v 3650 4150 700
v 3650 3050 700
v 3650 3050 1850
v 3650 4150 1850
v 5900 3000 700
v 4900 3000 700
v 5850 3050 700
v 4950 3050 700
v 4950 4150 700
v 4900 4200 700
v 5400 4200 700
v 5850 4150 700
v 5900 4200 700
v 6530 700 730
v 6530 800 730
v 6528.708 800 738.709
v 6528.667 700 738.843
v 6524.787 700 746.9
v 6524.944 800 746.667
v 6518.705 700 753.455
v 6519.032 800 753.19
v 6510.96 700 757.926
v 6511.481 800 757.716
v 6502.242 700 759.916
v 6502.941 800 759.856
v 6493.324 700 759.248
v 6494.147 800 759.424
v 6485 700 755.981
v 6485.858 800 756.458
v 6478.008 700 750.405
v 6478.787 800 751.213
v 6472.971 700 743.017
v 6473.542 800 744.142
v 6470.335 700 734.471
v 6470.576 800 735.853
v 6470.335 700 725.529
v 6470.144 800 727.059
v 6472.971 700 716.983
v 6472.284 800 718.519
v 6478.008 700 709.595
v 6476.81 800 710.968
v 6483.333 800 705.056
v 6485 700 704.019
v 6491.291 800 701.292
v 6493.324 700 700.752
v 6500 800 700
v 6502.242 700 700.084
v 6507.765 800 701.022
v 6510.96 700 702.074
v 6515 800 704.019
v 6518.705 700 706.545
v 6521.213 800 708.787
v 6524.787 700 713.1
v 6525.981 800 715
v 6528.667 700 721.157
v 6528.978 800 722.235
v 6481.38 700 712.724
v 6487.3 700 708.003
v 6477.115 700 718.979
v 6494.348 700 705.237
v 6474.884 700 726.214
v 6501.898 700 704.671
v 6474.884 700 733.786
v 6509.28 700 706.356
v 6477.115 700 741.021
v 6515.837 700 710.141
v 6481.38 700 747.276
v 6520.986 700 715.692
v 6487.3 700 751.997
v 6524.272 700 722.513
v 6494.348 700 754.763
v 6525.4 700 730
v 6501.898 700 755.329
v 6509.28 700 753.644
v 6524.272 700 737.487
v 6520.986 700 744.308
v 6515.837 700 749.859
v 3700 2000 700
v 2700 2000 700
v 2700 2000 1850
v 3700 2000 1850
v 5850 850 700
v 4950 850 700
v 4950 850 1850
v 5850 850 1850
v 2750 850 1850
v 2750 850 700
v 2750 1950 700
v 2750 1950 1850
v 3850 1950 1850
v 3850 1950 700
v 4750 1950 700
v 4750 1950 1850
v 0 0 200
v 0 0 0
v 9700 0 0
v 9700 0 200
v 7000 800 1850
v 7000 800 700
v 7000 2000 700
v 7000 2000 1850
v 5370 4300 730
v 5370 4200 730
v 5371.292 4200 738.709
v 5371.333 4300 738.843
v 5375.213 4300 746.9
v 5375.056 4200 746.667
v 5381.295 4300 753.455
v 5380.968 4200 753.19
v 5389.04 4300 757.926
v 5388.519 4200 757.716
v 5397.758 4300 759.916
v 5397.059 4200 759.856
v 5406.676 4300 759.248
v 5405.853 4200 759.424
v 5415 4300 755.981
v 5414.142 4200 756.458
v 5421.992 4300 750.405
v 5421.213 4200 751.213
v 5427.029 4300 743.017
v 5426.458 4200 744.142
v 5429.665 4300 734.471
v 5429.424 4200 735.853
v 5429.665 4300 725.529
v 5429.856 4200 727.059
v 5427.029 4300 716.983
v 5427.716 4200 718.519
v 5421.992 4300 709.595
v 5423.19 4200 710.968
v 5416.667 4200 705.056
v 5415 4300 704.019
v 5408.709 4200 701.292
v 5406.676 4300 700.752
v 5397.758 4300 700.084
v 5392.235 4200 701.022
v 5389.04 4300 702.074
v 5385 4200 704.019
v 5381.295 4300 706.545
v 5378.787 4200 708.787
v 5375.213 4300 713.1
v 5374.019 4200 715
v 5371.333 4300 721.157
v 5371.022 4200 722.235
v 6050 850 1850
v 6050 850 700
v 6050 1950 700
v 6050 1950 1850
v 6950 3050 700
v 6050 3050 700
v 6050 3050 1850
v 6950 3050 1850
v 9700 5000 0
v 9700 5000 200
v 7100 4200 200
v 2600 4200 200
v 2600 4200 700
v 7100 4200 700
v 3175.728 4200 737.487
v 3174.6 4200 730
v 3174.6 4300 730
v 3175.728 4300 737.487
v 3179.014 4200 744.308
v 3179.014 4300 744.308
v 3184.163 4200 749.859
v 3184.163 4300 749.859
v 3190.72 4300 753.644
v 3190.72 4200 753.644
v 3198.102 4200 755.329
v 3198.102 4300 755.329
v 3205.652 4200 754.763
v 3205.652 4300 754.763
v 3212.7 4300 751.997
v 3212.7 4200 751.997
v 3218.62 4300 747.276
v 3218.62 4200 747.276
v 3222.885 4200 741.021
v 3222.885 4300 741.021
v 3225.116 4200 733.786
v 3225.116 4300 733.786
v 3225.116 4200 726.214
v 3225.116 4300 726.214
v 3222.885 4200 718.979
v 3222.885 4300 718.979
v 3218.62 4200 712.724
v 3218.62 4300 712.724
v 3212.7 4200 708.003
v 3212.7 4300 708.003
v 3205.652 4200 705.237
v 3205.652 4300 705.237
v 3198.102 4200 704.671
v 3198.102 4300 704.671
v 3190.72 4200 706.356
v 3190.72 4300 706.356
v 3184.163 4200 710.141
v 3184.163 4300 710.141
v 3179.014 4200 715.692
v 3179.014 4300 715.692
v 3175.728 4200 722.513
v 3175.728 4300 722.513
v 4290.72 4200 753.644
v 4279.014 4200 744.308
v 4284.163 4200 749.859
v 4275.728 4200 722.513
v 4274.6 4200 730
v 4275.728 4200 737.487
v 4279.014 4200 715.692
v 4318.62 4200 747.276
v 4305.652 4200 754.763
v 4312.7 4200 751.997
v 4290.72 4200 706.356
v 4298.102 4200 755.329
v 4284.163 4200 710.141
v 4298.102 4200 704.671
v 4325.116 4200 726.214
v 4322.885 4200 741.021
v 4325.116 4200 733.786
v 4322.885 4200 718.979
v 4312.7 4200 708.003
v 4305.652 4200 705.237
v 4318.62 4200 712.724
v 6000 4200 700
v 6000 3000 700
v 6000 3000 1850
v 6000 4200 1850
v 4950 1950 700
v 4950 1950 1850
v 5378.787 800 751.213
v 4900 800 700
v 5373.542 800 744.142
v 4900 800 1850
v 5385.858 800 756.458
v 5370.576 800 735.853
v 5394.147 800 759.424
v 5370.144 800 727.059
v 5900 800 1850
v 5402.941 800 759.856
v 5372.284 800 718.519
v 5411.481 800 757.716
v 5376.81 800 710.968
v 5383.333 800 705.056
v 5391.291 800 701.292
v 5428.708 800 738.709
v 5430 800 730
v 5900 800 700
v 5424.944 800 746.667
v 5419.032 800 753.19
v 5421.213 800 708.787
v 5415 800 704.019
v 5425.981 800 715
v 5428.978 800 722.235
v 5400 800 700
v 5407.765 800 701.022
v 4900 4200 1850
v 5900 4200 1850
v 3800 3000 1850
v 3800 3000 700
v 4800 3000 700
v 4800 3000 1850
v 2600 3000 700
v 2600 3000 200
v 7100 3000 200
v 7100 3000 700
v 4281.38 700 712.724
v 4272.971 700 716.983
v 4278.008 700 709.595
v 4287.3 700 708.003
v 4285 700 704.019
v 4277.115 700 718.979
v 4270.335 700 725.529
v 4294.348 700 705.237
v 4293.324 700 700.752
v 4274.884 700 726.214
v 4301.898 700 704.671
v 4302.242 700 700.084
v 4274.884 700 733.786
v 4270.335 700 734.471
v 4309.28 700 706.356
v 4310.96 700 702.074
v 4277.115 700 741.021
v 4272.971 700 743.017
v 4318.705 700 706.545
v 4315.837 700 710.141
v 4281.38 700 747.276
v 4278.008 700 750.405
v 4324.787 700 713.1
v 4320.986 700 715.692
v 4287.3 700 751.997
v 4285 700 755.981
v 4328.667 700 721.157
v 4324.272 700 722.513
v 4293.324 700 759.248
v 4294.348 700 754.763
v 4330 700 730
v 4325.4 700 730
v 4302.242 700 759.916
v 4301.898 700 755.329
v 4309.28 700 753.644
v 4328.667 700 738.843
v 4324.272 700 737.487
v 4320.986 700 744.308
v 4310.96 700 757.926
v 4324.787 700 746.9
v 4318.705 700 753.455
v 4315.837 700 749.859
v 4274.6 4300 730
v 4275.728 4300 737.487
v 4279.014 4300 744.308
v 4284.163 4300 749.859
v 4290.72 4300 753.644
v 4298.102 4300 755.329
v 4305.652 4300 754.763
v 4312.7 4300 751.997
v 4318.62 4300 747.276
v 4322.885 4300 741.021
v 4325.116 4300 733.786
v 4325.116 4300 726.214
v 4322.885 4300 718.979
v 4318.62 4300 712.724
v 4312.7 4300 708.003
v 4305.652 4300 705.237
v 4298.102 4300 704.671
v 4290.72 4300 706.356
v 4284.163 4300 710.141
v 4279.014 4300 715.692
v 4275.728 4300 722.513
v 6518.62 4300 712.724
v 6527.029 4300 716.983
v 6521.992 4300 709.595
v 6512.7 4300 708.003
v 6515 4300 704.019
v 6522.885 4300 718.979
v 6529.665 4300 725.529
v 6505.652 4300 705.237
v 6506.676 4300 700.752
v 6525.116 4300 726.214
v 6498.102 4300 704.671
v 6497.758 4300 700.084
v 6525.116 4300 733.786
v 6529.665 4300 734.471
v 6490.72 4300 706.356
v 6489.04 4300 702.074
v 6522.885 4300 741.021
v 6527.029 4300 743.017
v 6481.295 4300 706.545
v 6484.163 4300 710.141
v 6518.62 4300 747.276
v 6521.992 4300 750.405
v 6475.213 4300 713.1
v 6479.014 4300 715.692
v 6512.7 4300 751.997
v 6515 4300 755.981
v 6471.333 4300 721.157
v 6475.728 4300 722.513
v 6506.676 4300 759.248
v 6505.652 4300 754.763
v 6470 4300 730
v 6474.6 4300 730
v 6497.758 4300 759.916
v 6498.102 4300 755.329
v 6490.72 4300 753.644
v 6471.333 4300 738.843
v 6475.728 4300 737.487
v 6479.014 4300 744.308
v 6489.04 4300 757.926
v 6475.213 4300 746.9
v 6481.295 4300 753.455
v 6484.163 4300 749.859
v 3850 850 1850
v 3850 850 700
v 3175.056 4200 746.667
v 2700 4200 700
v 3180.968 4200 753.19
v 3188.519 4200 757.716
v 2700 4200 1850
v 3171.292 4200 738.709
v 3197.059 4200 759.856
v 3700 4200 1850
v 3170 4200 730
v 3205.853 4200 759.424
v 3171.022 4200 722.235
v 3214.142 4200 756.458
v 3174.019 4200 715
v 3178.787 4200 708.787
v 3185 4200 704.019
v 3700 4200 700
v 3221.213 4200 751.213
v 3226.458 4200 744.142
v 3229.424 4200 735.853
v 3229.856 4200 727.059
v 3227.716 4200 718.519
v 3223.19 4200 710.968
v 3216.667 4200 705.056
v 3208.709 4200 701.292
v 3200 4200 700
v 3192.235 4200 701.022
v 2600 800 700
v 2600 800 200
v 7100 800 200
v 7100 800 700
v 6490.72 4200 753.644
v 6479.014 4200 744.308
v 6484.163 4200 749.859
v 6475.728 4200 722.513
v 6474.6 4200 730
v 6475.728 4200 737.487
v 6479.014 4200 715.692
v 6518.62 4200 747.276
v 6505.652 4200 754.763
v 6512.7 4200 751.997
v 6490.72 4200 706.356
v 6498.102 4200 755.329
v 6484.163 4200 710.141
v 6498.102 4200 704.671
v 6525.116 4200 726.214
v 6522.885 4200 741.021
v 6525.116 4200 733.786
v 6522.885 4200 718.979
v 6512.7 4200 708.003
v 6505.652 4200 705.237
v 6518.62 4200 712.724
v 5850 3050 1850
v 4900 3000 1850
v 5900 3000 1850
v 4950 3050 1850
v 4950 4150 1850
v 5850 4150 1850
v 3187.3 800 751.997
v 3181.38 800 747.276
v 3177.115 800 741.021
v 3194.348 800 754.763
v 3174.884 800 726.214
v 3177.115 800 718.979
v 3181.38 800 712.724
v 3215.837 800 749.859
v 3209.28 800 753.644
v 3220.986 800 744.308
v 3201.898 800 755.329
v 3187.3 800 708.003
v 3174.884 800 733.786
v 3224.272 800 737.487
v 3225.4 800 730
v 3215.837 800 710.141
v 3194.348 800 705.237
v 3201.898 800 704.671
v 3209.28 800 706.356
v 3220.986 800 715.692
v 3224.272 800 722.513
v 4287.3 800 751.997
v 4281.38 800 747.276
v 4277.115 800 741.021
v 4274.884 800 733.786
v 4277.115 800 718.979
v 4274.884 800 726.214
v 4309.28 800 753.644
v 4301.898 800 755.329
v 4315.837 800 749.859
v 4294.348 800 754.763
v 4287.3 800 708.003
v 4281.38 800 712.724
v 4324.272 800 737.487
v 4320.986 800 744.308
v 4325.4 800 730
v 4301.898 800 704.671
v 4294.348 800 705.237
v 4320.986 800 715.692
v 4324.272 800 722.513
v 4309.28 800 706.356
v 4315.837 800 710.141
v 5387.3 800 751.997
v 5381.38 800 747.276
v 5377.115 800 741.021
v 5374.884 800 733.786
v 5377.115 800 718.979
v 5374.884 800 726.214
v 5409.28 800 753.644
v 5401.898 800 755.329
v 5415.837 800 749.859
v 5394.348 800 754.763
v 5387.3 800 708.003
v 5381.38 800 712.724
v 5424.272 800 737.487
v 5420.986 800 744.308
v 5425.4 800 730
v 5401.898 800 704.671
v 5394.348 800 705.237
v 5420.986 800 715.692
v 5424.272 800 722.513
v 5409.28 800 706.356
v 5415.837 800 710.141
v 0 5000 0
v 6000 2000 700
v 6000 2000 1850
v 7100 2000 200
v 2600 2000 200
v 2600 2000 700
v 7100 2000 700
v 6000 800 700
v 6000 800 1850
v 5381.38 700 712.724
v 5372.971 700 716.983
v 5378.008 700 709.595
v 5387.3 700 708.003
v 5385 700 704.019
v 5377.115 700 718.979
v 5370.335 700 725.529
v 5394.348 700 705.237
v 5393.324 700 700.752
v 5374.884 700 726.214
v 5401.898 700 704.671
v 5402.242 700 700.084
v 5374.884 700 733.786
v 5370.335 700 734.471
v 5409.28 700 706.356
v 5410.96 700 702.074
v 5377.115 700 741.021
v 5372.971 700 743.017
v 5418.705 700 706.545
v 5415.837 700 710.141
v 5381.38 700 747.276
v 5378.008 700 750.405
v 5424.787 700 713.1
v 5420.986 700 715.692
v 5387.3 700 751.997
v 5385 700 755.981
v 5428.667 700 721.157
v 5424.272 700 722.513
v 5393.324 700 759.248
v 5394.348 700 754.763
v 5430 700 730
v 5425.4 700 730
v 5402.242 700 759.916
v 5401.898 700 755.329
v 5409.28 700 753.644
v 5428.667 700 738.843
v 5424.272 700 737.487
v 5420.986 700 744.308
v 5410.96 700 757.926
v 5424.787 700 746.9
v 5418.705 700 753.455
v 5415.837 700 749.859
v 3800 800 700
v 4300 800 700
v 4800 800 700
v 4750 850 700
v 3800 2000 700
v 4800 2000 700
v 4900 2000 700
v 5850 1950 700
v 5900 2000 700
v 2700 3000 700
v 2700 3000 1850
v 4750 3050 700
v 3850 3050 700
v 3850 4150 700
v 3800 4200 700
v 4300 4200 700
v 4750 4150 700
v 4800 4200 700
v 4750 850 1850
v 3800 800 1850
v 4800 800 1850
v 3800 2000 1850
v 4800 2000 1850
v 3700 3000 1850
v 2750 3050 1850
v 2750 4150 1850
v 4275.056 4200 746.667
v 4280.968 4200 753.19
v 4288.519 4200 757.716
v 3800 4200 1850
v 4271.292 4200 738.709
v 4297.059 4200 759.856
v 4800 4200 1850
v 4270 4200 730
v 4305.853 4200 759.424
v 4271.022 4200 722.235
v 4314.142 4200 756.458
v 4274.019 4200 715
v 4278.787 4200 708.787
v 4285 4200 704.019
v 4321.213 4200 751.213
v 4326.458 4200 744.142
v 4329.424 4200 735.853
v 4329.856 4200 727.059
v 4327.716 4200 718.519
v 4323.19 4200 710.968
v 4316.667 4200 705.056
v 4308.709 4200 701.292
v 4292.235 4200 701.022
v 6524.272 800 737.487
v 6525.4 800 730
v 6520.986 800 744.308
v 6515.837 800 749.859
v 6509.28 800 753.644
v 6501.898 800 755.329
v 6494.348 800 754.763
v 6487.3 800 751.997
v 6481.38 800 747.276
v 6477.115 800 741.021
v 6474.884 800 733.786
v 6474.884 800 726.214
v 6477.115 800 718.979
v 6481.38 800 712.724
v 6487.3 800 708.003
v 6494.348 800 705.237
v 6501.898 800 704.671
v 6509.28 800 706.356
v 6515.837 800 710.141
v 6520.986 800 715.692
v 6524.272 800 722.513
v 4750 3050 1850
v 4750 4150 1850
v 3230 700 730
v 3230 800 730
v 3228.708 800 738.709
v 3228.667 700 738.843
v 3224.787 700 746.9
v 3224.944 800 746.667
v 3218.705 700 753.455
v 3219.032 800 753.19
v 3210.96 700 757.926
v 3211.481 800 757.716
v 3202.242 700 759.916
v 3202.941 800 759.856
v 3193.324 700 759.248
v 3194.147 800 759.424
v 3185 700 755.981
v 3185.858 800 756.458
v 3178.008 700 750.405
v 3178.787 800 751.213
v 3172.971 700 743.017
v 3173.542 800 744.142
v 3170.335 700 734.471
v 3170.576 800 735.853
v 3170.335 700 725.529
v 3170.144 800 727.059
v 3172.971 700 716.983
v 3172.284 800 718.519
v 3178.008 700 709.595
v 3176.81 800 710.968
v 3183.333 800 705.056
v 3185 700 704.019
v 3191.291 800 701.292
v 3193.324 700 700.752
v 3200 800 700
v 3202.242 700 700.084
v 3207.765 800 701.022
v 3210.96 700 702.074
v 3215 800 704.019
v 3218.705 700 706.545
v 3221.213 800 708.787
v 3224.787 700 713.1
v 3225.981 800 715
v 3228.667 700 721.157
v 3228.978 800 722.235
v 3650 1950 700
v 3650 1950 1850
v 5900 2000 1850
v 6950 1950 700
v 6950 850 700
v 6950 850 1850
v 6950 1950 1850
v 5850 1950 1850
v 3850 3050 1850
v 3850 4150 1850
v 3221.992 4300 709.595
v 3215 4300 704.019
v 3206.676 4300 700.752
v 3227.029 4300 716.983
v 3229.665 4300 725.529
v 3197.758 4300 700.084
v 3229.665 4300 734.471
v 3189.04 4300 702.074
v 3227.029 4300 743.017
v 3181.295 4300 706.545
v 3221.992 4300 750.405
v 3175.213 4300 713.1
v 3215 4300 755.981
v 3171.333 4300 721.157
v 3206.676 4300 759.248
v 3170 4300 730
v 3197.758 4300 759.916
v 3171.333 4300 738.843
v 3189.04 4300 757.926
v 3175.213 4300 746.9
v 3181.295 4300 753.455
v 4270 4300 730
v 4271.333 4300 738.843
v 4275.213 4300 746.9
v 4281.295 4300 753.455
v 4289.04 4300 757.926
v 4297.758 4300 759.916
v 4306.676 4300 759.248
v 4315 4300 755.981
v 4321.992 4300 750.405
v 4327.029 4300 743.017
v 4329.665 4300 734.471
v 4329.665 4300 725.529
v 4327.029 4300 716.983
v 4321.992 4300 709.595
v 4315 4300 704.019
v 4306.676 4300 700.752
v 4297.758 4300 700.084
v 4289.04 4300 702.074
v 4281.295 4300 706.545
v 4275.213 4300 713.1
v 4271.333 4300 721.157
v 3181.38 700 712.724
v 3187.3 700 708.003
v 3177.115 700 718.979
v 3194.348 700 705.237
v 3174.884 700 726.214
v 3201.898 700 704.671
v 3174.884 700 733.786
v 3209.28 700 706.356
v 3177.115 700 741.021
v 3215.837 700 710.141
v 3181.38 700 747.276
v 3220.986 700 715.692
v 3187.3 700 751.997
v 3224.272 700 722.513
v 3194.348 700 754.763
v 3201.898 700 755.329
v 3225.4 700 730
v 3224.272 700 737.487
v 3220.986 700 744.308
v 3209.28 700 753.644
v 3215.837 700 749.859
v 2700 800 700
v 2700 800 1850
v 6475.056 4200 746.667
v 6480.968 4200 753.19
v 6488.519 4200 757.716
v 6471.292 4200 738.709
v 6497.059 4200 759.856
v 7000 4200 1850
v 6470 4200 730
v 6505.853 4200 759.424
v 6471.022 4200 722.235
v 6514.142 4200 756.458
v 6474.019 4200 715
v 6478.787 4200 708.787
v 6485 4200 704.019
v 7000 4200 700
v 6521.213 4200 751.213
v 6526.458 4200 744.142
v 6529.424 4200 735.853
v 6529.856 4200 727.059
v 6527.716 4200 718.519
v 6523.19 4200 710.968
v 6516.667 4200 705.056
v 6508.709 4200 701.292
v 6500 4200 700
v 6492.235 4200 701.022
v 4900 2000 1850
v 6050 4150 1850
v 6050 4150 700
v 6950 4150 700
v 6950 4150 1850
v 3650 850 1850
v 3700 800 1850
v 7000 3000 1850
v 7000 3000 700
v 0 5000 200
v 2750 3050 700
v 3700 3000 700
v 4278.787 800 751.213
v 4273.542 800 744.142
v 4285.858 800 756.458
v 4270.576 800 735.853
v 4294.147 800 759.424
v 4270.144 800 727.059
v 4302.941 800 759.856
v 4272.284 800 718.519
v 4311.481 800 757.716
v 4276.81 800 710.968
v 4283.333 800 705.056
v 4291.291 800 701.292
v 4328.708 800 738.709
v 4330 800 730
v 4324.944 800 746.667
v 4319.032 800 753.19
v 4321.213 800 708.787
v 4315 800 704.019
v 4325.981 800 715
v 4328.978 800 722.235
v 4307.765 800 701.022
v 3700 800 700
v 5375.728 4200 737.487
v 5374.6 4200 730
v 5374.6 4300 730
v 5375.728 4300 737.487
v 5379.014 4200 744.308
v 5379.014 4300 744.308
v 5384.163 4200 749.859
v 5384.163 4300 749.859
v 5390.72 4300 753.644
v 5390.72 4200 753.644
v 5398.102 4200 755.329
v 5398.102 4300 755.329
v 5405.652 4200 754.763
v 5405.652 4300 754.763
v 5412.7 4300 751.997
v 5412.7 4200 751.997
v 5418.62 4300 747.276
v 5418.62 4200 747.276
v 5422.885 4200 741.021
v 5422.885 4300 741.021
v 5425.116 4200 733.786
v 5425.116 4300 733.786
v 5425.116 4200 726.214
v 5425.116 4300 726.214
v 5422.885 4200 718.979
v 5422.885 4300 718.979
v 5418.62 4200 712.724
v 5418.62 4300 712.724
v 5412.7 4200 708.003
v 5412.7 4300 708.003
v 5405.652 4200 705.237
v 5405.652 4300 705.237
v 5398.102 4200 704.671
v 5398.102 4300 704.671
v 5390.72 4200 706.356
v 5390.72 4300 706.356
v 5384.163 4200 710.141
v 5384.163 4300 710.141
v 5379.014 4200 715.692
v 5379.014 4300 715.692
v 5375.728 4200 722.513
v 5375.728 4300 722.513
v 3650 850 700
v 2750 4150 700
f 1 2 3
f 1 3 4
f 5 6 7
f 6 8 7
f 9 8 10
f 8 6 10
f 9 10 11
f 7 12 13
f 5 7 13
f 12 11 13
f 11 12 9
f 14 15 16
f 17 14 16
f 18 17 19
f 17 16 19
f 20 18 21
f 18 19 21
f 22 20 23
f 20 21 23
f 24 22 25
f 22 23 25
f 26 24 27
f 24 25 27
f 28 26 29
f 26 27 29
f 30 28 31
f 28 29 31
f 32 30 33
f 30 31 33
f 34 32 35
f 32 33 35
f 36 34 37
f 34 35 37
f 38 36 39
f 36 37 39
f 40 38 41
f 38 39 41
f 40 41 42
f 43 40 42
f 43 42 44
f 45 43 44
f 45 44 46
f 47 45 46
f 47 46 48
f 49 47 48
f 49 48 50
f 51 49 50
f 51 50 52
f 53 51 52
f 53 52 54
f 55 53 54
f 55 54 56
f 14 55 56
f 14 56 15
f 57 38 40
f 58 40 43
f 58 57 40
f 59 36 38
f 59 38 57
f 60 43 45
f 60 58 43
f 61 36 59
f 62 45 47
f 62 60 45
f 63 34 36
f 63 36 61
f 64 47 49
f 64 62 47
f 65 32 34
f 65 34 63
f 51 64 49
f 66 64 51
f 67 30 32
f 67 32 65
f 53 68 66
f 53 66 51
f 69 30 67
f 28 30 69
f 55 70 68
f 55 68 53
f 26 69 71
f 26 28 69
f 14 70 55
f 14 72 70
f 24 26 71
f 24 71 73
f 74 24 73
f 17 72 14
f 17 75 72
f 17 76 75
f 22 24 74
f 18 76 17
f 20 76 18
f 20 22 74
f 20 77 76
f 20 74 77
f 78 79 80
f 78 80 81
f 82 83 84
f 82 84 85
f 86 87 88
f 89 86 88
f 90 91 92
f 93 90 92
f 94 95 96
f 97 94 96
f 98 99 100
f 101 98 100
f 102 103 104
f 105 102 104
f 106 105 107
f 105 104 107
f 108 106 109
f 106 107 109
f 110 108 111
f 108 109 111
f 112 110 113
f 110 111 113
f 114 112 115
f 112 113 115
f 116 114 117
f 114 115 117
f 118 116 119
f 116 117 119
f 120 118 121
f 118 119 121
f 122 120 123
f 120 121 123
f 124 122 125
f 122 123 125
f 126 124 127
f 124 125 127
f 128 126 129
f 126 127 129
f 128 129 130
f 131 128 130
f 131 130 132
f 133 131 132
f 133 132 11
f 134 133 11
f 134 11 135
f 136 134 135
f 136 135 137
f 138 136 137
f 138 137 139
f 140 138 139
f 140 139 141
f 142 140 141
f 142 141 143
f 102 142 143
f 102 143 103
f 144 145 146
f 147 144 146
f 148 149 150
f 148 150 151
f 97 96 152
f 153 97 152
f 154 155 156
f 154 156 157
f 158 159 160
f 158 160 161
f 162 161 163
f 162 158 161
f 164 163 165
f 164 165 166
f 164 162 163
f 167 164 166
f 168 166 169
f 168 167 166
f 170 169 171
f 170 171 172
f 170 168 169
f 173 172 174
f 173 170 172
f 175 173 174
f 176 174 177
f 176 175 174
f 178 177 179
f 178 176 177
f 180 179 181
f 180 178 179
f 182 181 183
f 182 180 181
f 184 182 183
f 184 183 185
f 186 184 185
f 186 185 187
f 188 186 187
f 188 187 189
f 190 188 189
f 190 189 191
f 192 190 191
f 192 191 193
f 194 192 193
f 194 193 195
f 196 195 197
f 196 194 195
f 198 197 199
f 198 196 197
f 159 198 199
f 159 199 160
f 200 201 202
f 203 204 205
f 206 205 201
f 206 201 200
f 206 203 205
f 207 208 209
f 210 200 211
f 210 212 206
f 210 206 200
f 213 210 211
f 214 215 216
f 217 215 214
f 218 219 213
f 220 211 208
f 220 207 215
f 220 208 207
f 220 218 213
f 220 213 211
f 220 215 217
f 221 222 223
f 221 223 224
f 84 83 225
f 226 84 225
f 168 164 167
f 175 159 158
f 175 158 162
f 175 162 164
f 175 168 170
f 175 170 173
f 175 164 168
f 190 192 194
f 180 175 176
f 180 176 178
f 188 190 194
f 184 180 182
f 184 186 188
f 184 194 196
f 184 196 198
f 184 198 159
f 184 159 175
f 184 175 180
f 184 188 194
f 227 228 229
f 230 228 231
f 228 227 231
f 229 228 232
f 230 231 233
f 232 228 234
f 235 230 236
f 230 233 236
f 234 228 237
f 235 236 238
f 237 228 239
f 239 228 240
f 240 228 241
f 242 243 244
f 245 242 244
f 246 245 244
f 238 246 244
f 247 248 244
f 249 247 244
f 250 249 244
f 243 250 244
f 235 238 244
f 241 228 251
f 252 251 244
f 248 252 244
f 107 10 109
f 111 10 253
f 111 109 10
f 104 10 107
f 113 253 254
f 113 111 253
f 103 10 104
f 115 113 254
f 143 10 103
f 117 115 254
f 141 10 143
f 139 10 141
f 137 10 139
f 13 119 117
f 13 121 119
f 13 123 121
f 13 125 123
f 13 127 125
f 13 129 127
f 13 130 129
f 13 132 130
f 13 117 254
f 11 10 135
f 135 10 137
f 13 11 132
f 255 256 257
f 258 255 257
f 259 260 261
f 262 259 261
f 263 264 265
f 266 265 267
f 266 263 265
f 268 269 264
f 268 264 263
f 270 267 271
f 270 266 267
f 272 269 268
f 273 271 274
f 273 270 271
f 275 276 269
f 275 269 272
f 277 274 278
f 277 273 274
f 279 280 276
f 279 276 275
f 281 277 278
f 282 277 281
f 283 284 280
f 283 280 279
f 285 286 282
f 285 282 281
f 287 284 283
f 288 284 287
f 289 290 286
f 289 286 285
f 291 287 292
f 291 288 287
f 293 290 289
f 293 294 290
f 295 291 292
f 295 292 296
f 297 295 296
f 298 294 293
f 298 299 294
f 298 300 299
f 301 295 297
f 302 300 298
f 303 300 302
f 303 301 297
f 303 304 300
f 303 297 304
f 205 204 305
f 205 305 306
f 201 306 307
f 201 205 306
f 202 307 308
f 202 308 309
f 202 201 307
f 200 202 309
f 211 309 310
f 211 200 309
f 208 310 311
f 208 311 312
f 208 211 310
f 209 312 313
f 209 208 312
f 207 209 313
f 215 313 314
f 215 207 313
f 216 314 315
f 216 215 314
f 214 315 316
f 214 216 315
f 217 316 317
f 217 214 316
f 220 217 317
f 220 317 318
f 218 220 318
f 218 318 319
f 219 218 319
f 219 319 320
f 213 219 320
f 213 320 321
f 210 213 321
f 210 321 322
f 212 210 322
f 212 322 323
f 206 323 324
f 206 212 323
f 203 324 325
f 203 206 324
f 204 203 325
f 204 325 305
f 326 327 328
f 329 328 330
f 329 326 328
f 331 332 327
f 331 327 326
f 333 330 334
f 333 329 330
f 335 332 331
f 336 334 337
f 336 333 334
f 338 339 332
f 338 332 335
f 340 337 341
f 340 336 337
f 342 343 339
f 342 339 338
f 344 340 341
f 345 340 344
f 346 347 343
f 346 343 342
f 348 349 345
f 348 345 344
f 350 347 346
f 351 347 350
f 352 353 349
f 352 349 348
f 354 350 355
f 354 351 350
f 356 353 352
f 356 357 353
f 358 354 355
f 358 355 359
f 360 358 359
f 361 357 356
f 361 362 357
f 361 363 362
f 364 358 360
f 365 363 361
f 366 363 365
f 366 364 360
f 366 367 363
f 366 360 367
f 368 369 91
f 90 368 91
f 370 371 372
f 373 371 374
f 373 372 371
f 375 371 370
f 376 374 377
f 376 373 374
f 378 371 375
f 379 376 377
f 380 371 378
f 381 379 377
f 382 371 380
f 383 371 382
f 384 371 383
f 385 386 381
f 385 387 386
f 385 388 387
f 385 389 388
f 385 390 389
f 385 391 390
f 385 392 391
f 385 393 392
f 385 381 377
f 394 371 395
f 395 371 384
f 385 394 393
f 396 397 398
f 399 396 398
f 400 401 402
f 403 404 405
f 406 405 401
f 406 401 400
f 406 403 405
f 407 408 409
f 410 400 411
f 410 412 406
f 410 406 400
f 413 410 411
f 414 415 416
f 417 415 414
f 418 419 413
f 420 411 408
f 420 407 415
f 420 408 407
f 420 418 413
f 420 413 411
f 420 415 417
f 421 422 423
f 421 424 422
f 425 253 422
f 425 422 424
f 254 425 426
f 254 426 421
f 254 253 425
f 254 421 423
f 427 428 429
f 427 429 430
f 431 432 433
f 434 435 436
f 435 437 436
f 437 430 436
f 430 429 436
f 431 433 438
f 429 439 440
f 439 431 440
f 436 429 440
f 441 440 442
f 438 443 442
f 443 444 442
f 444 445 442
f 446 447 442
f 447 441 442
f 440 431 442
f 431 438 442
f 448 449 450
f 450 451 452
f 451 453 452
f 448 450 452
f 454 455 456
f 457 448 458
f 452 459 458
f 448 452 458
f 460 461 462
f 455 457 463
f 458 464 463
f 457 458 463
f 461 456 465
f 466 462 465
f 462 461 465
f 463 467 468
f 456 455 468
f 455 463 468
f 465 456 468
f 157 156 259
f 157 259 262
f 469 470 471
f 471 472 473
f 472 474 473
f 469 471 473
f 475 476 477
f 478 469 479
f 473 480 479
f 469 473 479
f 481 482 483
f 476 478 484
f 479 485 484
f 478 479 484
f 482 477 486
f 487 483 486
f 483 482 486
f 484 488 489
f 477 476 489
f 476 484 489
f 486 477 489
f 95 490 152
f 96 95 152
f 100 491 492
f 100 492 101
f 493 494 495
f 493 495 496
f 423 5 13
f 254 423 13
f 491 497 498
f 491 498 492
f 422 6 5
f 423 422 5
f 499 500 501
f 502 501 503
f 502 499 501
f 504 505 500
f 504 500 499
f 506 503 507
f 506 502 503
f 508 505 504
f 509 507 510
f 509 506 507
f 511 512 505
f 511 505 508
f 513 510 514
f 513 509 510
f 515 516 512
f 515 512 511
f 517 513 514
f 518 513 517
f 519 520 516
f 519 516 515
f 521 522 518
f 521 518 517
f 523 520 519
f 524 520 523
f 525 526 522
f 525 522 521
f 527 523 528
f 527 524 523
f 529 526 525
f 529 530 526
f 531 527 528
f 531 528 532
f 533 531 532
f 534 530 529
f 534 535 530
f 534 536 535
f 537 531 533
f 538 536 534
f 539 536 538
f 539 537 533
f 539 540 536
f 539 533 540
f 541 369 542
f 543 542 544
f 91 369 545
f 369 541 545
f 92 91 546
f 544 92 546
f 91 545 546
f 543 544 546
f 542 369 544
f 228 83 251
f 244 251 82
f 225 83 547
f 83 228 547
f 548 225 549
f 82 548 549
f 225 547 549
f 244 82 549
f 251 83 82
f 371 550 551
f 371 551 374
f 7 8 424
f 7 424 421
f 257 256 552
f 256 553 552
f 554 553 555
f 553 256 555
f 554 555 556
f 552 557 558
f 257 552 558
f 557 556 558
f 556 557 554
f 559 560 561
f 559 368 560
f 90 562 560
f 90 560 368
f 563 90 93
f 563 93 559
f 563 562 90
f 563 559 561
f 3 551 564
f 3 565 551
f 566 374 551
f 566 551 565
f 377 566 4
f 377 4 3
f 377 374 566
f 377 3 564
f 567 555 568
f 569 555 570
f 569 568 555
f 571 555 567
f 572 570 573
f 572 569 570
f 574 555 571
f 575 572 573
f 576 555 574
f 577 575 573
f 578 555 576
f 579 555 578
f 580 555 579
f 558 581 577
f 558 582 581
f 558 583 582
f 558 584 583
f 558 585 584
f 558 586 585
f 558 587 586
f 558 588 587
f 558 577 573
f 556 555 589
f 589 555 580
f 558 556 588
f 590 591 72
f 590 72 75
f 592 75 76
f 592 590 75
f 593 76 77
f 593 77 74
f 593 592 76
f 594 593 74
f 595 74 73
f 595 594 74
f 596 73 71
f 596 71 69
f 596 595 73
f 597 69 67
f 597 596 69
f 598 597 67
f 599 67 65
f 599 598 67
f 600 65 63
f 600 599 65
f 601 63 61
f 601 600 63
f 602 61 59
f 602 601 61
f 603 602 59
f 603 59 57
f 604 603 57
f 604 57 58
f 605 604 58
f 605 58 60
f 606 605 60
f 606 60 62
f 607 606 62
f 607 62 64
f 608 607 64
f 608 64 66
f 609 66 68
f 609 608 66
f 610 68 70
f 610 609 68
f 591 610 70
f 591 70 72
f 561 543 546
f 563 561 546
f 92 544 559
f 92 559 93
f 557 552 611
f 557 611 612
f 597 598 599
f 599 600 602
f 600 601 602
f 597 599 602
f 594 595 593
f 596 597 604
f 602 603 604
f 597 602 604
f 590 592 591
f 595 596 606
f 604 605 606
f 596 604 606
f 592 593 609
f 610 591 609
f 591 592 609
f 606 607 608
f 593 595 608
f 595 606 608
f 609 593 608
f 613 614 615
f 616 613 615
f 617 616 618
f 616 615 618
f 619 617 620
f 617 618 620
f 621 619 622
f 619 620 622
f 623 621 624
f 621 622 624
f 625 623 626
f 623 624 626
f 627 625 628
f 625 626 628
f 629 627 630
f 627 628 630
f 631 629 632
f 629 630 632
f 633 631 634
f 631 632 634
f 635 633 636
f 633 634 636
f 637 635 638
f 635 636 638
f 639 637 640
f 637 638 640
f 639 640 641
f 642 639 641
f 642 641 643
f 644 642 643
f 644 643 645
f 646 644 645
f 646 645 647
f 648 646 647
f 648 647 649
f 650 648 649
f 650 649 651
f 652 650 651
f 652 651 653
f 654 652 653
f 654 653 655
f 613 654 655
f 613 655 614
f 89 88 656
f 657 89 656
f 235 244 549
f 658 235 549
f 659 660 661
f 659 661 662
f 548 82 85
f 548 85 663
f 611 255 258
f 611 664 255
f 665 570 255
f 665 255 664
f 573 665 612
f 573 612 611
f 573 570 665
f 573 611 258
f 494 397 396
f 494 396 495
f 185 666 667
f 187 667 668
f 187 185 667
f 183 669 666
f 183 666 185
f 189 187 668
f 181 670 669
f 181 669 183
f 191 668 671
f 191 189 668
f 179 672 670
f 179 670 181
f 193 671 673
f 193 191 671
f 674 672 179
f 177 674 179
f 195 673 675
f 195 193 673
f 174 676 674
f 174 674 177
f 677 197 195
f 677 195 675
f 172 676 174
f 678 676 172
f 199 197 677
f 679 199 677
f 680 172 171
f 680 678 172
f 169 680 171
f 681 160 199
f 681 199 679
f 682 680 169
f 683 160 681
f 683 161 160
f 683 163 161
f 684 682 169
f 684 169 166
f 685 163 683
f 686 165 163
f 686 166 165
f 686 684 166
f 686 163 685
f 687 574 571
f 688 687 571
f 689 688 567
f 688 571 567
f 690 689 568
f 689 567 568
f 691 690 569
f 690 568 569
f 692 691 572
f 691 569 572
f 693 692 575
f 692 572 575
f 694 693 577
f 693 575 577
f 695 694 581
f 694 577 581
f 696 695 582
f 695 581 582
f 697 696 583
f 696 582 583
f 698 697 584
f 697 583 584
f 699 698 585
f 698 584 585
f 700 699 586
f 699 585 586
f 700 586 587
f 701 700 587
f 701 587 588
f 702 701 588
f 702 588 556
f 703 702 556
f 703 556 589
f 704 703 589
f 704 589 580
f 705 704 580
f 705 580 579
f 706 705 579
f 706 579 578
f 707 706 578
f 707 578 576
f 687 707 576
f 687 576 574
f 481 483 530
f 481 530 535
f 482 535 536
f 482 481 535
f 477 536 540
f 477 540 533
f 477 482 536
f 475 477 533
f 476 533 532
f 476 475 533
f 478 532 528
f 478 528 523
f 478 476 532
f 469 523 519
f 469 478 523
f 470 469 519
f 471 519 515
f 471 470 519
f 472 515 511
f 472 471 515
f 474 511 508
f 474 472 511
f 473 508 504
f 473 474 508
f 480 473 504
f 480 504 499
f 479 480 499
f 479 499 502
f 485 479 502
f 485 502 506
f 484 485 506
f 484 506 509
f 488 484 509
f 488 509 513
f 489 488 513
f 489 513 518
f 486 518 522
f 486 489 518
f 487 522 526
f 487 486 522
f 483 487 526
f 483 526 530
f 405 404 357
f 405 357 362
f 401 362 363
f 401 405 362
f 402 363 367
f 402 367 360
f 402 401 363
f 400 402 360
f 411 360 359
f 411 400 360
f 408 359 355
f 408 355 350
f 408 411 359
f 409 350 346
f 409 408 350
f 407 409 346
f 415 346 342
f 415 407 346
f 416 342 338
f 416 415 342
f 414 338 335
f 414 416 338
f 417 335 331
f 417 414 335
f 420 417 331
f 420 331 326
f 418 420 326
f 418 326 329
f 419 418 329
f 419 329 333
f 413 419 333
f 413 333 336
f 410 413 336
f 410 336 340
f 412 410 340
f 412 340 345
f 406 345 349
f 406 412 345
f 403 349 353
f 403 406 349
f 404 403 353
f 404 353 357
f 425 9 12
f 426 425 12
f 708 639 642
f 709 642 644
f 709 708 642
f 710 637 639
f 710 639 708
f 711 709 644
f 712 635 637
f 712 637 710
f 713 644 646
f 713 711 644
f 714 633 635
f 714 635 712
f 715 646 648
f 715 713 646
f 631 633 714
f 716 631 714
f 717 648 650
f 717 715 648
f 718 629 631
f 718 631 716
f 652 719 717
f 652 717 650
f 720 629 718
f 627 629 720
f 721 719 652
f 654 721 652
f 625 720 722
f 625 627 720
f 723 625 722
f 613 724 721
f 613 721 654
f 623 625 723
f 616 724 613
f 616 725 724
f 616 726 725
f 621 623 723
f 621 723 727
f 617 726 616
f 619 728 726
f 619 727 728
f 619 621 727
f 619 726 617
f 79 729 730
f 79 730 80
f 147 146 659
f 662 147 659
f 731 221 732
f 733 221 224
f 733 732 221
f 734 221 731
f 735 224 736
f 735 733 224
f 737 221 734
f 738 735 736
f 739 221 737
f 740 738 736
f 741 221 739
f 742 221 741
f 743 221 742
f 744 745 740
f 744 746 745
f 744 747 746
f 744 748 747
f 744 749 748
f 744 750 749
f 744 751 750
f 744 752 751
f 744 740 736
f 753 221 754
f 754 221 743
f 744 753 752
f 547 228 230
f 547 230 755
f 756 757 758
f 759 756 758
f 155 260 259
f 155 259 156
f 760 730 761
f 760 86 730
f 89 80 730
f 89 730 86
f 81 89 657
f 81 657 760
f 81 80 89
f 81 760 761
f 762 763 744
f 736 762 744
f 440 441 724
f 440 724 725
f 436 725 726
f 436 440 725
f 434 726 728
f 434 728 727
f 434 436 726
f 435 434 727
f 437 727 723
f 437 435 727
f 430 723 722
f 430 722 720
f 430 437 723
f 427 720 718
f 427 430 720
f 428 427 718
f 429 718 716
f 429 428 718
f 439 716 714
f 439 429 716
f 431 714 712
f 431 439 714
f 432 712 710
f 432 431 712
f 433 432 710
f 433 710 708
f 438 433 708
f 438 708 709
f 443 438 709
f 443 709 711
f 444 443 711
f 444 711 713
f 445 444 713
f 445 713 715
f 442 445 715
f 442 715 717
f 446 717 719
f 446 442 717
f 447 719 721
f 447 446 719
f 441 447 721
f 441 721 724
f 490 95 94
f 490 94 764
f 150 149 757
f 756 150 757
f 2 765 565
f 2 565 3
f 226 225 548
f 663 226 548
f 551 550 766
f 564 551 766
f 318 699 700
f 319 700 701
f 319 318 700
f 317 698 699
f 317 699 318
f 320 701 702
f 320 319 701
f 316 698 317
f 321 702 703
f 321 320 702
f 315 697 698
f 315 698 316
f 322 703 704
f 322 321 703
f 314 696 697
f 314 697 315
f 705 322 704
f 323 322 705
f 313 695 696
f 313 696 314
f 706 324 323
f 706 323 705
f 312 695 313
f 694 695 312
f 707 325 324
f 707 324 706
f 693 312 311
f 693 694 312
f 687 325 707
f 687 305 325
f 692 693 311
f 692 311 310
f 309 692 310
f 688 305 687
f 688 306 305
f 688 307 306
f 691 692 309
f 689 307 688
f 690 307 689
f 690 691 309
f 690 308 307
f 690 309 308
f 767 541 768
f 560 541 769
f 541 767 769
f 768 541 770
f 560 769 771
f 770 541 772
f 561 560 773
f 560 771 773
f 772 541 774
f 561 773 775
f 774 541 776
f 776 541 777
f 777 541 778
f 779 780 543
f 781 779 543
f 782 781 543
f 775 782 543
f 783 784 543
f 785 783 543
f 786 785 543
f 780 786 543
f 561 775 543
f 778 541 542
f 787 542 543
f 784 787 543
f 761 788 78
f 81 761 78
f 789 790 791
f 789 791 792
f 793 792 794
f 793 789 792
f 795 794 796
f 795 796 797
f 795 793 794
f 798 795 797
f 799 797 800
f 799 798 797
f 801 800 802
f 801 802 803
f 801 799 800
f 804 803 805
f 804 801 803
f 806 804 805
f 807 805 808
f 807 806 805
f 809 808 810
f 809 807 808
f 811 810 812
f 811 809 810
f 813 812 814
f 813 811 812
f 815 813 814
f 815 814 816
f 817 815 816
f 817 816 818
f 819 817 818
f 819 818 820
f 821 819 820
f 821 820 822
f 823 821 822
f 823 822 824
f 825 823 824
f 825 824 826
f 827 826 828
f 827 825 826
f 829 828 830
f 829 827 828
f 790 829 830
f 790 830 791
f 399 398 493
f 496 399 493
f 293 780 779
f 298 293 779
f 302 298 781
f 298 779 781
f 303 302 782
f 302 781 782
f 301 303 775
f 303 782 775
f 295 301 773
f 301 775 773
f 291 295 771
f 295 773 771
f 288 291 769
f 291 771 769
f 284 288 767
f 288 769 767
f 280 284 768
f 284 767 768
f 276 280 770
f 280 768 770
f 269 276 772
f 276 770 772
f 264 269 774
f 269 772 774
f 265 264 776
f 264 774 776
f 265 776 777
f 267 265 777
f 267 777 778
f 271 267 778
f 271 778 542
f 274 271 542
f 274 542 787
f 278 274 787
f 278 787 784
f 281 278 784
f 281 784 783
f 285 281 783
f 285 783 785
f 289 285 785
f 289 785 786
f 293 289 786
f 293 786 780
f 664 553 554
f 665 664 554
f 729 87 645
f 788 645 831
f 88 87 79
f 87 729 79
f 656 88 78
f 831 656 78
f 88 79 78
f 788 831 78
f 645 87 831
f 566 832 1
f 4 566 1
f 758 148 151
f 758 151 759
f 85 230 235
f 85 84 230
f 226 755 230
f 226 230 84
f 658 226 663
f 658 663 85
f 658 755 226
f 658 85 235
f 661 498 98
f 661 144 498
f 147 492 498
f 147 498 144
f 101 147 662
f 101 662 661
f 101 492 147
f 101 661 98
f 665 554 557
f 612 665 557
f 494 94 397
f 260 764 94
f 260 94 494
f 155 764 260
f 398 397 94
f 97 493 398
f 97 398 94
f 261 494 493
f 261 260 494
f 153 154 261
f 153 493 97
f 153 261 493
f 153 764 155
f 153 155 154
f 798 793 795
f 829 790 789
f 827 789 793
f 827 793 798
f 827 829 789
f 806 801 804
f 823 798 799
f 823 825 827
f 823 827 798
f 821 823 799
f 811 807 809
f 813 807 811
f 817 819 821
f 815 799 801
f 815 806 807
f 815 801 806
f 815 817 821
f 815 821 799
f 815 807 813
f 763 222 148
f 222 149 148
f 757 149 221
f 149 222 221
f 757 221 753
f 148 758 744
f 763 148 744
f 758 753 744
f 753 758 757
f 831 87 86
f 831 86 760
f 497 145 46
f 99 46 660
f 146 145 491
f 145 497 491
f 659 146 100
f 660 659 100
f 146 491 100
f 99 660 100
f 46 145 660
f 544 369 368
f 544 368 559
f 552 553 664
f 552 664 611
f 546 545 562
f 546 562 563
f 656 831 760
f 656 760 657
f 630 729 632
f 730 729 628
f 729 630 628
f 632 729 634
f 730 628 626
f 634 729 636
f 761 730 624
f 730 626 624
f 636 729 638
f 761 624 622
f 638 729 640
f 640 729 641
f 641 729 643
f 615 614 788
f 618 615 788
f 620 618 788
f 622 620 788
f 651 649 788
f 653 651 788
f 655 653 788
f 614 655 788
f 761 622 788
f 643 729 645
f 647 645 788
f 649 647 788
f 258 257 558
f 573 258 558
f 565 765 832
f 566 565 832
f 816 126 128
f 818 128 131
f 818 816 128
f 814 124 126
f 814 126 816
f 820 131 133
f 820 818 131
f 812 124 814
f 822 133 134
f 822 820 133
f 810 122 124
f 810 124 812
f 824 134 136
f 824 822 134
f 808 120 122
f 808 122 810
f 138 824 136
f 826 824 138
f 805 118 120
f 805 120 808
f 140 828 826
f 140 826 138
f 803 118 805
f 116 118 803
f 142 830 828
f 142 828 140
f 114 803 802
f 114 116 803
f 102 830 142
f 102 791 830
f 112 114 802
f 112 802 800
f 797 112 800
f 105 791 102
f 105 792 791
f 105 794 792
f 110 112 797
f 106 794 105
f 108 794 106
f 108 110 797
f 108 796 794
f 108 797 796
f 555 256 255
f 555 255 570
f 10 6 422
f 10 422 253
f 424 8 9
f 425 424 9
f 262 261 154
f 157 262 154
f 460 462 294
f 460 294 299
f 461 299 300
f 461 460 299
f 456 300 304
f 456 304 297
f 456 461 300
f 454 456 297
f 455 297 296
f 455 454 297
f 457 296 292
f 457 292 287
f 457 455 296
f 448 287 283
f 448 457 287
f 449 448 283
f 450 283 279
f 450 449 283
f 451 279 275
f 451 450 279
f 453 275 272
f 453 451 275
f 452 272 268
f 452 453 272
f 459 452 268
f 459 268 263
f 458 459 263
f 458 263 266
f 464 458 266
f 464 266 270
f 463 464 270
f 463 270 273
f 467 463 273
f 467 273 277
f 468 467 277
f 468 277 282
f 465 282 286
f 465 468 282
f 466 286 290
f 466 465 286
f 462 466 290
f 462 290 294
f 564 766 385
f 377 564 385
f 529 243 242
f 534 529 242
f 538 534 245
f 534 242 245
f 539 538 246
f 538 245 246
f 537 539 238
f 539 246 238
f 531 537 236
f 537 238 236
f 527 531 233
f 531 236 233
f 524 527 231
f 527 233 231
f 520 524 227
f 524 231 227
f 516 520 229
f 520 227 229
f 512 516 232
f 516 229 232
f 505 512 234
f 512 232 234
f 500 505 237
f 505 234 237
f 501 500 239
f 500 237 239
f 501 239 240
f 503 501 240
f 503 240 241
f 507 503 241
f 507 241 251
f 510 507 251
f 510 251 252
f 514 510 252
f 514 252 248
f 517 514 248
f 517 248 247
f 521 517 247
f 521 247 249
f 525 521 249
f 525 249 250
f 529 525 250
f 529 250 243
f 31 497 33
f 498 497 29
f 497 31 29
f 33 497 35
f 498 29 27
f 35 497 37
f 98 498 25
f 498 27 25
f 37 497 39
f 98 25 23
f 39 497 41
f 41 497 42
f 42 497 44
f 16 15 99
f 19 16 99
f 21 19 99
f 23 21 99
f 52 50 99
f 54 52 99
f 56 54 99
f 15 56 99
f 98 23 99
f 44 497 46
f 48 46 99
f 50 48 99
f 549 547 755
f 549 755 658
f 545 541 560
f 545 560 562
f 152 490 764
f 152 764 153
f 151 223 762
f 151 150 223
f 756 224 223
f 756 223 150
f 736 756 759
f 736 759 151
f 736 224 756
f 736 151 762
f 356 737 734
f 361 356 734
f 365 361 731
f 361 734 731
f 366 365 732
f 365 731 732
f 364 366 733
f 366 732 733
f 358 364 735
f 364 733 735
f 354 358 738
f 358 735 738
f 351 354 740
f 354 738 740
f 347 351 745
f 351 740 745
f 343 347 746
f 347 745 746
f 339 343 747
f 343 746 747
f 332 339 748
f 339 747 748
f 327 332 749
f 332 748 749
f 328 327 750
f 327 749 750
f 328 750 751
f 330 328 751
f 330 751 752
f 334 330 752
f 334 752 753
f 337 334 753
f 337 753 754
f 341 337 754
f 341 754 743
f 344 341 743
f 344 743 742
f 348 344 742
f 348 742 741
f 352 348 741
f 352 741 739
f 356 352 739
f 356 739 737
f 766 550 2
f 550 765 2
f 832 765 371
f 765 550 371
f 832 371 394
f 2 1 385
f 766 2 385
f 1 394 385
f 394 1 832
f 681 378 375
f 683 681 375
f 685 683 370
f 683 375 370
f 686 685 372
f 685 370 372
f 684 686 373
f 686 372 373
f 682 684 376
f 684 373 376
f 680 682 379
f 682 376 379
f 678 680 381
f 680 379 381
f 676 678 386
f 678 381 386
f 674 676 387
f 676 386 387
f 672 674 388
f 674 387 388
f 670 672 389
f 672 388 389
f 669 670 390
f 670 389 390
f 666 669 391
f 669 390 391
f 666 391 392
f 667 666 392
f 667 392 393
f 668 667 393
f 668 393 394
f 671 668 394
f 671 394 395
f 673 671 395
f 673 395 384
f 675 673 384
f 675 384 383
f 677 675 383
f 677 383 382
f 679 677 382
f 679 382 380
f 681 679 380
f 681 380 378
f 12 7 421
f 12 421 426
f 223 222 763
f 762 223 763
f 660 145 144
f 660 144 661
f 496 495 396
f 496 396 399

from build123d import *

# Parameters (mm, degrees)
F0_W     = 9700
F0_H     = 5000
F1_DEPTH = 200
F2_W     = 4500
F2_H     = 1200
F3_DEPTH = 500
F4_W     = 1000
F4_H     = 1200
F4_W_2   = 900
F4_H_2   = 1100
F5_DEPTH = 1150
F6_R     = 30
F6_R_2   = 25.4
F7_DEPTH = 100
F8_R     = 30
F8_R_2   = 25.4
F9_DEPTH = 100


with BuildPart() as f1:
    # F0 (on Top) → F1 (new body)
    with BuildSketch(Plane.XY):
        with Locations((4850, 2500)):
            Rectangle(F0_W, F0_H)
    extrude(amount=F1_DEPTH)

    # F2 (on face) → F3 (join)
    with BuildSketch(Plane.XY.offset(200)):
        with Locations((4850, 1400)):
            Rectangle(F2_W, F2_H)
        with Locations((4850, 3600)):
            Rectangle(F2_W, F2_H)
    extrude(amount=F3_DEPTH)


with BuildPart() as f5:
    # F4 (on face) → F5 (new body)
    with BuildSketch(Plane.XY.offset(700)):
        with Locations((3200, 3600)):
            Rectangle(F4_W, F4_H)
        with Locations((3200, 3600)):
            Rectangle(F4_W_2, F4_H_2, mode=Mode.SUBTRACT)
    extrude(amount=F5_DEPTH)

    # F8 (on face) → F9, piece 4 (join)
    with BuildSketch(Plane(origin=(0, 4200, 0), x_dir=(-1, 0, 0), z_dir=(0, 1, 0))):
        with Locations((-3200, 730)):
            Circle(F8_R)
        with Locations((-3200, 730)):
            Circle(F8_R_2, mode=Mode.SUBTRACT)
    extrude(amount=F9_DEPTH)


with BuildPart() as f5b:
    # F4 (on face) → F5, piece 2 (new body)
    with BuildSketch(Plane.XY.offset(700)):
        with Locations((4300, 3600)):
            Rectangle(F4_W, F4_H)
        with Locations((4300, 3600)):
            Rectangle(F4_W_2, F4_H_2, mode=Mode.SUBTRACT)
    extrude(amount=F5_DEPTH)

    # F8 (on face) → F9, piece 3 (join)
    with BuildSketch(Plane(origin=(0, 4200, 0), x_dir=(-1, 0, 0), z_dir=(0, 1, 0))):
        with Locations((-4300, 730)):
            Circle(F8_R)
        with Locations((-4300, 730)):
            Circle(F8_R_2, mode=Mode.SUBTRACT)
    extrude(amount=F9_DEPTH)


with BuildPart() as f5c:
    # F4 (on face) → F5, piece 3 (new body)
    with BuildSketch(Plane.XY.offset(700)):
        with Locations((5400, 3600)):
            Rectangle(F4_W, F4_H)
        with Locations((5400, 3600)):
            Rectangle(F4_W_2, F4_H_2, mode=Mode.SUBTRACT)
    extrude(amount=F5_DEPTH)

    # F8 (on face) → F9, piece 2 (join)
    with BuildSketch(Plane(origin=(0, 4200, 0), x_dir=(-1, 0, 0), z_dir=(0, 1, 0))):
        with Locations((-5400, 730)):
            Circle(F8_R)
        with Locations((-5400, 730)):
            Circle(F8_R_2, mode=Mode.SUBTRACT)
    extrude(amount=F9_DEPTH)


with BuildPart() as f5d:
    # F4 (on face) → F5, piece 4 (new body)
    with BuildSketch(Plane.XY.offset(700)):
        with Locations((6500, 3600)):
            Rectangle(F4_W, F4_H)
        with Locations((6500, 3600)):
            Rectangle(F4_W_2, F4_H_2, mode=Mode.SUBTRACT)
    extrude(amount=F5_DEPTH)

    # F8 (on face) → F9 (join)
    with BuildSketch(Plane(origin=(0, 4200, 0), x_dir=(-1, 0, 0), z_dir=(0, 1, 0))):
        with Locations((-6500, 730)):
            Circle(F8_R)
        with Locations((-6500, 730)):
            Circle(F8_R_2, mode=Mode.SUBTRACT)
    extrude(amount=F9_DEPTH)


with BuildPart() as f5e:
    # F4 (on face) → F5, piece 5 (new body)
    with BuildSketch(Plane.XY.offset(700)):
        with Locations((4300, 1400)):
            Rectangle(F4_W, F4_H)
        with Locations((4300, 1400)):
            Rectangle(F4_W_2, F4_H_2, mode=Mode.SUBTRACT)
    extrude(amount=F5_DEPTH)

    # F6 (on face) → F7, piece 2 (join)
    with BuildSketch(Plane.XZ.offset(-800)):
        with Locations((4300, 730)):
            Circle(F6_R)
        with Locations((4300, 730)):
            Circle(F6_R_2, mode=Mode.SUBTRACT)
    extrude(amount=F7_DEPTH)


with BuildPart() as f5f:
    # F4 (on face) → F5, piece 6 (new body)
    with BuildSketch(Plane.XY.offset(700)):
        with Locations((6500, 1400)):
            Rectangle(F4_W, F4_H)
        with Locations((6500, 1400)):
            Rectangle(F4_W_2, F4_H_2, mode=Mode.SUBTRACT)
    extrude(amount=F5_DEPTH)

    # F6 (on face) → F7, piece 4 (join)
    with BuildSketch(Plane.XZ.offset(-800)):
        with Locations((6500, 730)):
            Circle(F6_R)
        with Locations((6500, 730)):
            Circle(F6_R_2, mode=Mode.SUBTRACT)
    extrude(amount=F7_DEPTH)


with BuildPart() as f5g:
    # F4 (on face) → F5, piece 7 (new body)
    with BuildSketch(Plane.XY.offset(700)):
        with Locations((3200, 1400)):
            Rectangle(F4_W, F4_H)
        with Locations((3200, 1400)):
            Rectangle(F4_W_2, F4_H_2, mode=Mode.SUBTRACT)
    extrude(amount=F5_DEPTH)

    # F6 (on face) → F7 (join)
    with BuildSketch(Plane.XZ.offset(-800)):
        with Locations((3200, 730)):
            Circle(F6_R)
        with Locations((3200, 730)):
            Circle(F6_R_2, mode=Mode.SUBTRACT)
    extrude(amount=F7_DEPTH)


with BuildPart() as f5h:
    # F4 (on face) → F5, piece 8 (new body)
    with BuildSketch(Plane.XY.offset(700)):
        with Locations((5400, 1400)):
            Rectangle(F4_W, F4_H)
        with Locations((5400, 1400)):
            Rectangle(F4_W_2, F4_H_2, mode=Mode.SUBTRACT)
    extrude(amount=F5_DEPTH)

    # F6 (on face) → F7, piece 3 (join)
    with BuildSketch(Plane.XZ.offset(-800)):
        with Locations((5400, 730)):
            Circle(F6_R)
        with Locations((5400, 730)):
            Circle(F6_R_2, mode=Mode.SUBTRACT)
    extrude(amount=F7_DEPTH)


solid = Compound([f1.part, f5.part, f5b.part, f5c.part, f5d.part, f5e.part, f5f.part, f5g.part, f5h.part])
